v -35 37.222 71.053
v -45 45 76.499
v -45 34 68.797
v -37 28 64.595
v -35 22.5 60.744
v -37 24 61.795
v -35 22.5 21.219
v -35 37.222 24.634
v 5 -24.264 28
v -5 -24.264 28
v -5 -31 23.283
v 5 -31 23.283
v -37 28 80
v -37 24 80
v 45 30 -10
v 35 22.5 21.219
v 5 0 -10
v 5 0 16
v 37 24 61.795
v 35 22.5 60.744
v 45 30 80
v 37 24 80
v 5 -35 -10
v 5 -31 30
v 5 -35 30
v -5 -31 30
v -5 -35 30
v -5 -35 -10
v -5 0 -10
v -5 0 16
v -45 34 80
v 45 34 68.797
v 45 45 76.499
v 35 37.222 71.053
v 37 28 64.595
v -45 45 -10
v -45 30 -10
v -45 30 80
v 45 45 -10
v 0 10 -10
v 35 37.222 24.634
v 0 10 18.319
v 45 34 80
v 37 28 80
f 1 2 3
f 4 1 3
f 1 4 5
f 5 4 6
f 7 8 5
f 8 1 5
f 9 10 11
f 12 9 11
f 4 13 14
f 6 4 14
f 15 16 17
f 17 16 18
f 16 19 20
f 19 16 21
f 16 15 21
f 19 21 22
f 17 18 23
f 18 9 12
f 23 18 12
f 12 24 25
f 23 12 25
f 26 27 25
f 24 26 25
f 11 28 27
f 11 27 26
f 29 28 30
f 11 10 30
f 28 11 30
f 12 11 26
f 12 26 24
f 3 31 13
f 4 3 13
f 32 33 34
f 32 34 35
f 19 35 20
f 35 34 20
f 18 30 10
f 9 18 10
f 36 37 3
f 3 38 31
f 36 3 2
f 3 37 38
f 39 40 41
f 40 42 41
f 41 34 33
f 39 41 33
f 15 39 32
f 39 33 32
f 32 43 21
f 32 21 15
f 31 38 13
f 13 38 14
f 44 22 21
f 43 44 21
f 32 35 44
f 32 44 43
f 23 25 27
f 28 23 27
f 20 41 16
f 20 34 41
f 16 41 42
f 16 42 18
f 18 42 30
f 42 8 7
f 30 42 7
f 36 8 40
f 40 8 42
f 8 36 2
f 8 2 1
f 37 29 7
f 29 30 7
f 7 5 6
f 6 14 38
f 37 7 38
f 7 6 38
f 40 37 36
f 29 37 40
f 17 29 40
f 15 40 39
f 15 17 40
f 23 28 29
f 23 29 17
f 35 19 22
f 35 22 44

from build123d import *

# Parameters (mm, degrees)
F1_DEPTH      = 80
F3_DEPTH      = 50.001
F3_DEPTH_BACK = 40.001
F5_DEPTH      = 40
F5_DEPTH_BACK = 30
F6_W          = 10
F6_H          = 4
F7_DEPTH      = 30
F9_DEPTH      = 80
F11_DEPTH     = 10


with BuildPart() as f1:
    # F0 (on Top) → F1 (new body)
    with BuildSketch(Plane.XY):
        Polygon((-5, 0), (-5, -35), (5, -35), (5, 0), (45, 30), (45, 45), (0, 10), (-45, 45), (-45, 30), align=None)
    extrude(amount=F1_DEPTH)

    # F2 (on face) → F3 (cut, two sides)
    with BuildSketch(Plane(origin=(-5, 0, 0), x_dir=(0, -1, 0), z_dir=(-1, 0, 0))) as f3_sk:
        Polygon((35, 20.4823592522), (35, 80), (-50, 80), align=None)
    extrude(amount=-F3_DEPTH, mode=Mode.SUBTRACT)
    extrude(f3_sk.sketch, amount=F3_DEPTH_BACK, mode=Mode.SUBTRACT)

    # F4 (on face) → F5 (cut, two sides)
    with BuildSketch(Plane(origin=(-5, 0, 0), x_dir=(0, -1, 0), z_dir=(-1, 0, 0))) as f5_sk:
        Polygon((0, 16), (24.2636963506, 28), (24.2636963506, 88), (-51.7363036494, 88), (-51.7363036494, 28), align=None)
    extrude(amount=-F5_DEPTH, mode=Mode.SUBTRACT)
    extrude(f5_sk.sketch, amount=F5_DEPTH_BACK, mode=Mode.SUBTRACT)

    # F6 (on face) → F7 (join)
    with BuildSketch(Plane(origin=(0, 0, 0), x_dir=(1, 0, 0), z_dir=(0, 0, -1))):
        with Locations((0, 33)):
            Rectangle(F6_W, F6_H)
    extrude(amount=-F7_DEPTH)

    # F8 (on face) → F9 (join)
    with BuildSketch(Plane(origin=(0, 0, 0), x_dir=(1, 0, 0), z_dir=(0, 0, -1))):
        Polygon((-37, -24), (-45, -30), (-45, -34), (-37, -28), align=None)
        Polygon((45, -34), (45, -30), (37, -24), (37, -28), align=None)
    extrude(amount=-F9_DEPTH)

    # F10 (on face) → F11 (join)
    with BuildSketch(Plane(origin=(0, 0, 0), x_dir=(1, 0, 0), z_dir=(0, 0, -1))):
        Polygon((5, 35), (-5, 35), (-5, 0), (-45, -30), (-45, -45), (0, -10), (45, -45), (45, -30), (5, 0), align=None)
    extrude(amount=F11_DEPTH)


solid = f1.part
